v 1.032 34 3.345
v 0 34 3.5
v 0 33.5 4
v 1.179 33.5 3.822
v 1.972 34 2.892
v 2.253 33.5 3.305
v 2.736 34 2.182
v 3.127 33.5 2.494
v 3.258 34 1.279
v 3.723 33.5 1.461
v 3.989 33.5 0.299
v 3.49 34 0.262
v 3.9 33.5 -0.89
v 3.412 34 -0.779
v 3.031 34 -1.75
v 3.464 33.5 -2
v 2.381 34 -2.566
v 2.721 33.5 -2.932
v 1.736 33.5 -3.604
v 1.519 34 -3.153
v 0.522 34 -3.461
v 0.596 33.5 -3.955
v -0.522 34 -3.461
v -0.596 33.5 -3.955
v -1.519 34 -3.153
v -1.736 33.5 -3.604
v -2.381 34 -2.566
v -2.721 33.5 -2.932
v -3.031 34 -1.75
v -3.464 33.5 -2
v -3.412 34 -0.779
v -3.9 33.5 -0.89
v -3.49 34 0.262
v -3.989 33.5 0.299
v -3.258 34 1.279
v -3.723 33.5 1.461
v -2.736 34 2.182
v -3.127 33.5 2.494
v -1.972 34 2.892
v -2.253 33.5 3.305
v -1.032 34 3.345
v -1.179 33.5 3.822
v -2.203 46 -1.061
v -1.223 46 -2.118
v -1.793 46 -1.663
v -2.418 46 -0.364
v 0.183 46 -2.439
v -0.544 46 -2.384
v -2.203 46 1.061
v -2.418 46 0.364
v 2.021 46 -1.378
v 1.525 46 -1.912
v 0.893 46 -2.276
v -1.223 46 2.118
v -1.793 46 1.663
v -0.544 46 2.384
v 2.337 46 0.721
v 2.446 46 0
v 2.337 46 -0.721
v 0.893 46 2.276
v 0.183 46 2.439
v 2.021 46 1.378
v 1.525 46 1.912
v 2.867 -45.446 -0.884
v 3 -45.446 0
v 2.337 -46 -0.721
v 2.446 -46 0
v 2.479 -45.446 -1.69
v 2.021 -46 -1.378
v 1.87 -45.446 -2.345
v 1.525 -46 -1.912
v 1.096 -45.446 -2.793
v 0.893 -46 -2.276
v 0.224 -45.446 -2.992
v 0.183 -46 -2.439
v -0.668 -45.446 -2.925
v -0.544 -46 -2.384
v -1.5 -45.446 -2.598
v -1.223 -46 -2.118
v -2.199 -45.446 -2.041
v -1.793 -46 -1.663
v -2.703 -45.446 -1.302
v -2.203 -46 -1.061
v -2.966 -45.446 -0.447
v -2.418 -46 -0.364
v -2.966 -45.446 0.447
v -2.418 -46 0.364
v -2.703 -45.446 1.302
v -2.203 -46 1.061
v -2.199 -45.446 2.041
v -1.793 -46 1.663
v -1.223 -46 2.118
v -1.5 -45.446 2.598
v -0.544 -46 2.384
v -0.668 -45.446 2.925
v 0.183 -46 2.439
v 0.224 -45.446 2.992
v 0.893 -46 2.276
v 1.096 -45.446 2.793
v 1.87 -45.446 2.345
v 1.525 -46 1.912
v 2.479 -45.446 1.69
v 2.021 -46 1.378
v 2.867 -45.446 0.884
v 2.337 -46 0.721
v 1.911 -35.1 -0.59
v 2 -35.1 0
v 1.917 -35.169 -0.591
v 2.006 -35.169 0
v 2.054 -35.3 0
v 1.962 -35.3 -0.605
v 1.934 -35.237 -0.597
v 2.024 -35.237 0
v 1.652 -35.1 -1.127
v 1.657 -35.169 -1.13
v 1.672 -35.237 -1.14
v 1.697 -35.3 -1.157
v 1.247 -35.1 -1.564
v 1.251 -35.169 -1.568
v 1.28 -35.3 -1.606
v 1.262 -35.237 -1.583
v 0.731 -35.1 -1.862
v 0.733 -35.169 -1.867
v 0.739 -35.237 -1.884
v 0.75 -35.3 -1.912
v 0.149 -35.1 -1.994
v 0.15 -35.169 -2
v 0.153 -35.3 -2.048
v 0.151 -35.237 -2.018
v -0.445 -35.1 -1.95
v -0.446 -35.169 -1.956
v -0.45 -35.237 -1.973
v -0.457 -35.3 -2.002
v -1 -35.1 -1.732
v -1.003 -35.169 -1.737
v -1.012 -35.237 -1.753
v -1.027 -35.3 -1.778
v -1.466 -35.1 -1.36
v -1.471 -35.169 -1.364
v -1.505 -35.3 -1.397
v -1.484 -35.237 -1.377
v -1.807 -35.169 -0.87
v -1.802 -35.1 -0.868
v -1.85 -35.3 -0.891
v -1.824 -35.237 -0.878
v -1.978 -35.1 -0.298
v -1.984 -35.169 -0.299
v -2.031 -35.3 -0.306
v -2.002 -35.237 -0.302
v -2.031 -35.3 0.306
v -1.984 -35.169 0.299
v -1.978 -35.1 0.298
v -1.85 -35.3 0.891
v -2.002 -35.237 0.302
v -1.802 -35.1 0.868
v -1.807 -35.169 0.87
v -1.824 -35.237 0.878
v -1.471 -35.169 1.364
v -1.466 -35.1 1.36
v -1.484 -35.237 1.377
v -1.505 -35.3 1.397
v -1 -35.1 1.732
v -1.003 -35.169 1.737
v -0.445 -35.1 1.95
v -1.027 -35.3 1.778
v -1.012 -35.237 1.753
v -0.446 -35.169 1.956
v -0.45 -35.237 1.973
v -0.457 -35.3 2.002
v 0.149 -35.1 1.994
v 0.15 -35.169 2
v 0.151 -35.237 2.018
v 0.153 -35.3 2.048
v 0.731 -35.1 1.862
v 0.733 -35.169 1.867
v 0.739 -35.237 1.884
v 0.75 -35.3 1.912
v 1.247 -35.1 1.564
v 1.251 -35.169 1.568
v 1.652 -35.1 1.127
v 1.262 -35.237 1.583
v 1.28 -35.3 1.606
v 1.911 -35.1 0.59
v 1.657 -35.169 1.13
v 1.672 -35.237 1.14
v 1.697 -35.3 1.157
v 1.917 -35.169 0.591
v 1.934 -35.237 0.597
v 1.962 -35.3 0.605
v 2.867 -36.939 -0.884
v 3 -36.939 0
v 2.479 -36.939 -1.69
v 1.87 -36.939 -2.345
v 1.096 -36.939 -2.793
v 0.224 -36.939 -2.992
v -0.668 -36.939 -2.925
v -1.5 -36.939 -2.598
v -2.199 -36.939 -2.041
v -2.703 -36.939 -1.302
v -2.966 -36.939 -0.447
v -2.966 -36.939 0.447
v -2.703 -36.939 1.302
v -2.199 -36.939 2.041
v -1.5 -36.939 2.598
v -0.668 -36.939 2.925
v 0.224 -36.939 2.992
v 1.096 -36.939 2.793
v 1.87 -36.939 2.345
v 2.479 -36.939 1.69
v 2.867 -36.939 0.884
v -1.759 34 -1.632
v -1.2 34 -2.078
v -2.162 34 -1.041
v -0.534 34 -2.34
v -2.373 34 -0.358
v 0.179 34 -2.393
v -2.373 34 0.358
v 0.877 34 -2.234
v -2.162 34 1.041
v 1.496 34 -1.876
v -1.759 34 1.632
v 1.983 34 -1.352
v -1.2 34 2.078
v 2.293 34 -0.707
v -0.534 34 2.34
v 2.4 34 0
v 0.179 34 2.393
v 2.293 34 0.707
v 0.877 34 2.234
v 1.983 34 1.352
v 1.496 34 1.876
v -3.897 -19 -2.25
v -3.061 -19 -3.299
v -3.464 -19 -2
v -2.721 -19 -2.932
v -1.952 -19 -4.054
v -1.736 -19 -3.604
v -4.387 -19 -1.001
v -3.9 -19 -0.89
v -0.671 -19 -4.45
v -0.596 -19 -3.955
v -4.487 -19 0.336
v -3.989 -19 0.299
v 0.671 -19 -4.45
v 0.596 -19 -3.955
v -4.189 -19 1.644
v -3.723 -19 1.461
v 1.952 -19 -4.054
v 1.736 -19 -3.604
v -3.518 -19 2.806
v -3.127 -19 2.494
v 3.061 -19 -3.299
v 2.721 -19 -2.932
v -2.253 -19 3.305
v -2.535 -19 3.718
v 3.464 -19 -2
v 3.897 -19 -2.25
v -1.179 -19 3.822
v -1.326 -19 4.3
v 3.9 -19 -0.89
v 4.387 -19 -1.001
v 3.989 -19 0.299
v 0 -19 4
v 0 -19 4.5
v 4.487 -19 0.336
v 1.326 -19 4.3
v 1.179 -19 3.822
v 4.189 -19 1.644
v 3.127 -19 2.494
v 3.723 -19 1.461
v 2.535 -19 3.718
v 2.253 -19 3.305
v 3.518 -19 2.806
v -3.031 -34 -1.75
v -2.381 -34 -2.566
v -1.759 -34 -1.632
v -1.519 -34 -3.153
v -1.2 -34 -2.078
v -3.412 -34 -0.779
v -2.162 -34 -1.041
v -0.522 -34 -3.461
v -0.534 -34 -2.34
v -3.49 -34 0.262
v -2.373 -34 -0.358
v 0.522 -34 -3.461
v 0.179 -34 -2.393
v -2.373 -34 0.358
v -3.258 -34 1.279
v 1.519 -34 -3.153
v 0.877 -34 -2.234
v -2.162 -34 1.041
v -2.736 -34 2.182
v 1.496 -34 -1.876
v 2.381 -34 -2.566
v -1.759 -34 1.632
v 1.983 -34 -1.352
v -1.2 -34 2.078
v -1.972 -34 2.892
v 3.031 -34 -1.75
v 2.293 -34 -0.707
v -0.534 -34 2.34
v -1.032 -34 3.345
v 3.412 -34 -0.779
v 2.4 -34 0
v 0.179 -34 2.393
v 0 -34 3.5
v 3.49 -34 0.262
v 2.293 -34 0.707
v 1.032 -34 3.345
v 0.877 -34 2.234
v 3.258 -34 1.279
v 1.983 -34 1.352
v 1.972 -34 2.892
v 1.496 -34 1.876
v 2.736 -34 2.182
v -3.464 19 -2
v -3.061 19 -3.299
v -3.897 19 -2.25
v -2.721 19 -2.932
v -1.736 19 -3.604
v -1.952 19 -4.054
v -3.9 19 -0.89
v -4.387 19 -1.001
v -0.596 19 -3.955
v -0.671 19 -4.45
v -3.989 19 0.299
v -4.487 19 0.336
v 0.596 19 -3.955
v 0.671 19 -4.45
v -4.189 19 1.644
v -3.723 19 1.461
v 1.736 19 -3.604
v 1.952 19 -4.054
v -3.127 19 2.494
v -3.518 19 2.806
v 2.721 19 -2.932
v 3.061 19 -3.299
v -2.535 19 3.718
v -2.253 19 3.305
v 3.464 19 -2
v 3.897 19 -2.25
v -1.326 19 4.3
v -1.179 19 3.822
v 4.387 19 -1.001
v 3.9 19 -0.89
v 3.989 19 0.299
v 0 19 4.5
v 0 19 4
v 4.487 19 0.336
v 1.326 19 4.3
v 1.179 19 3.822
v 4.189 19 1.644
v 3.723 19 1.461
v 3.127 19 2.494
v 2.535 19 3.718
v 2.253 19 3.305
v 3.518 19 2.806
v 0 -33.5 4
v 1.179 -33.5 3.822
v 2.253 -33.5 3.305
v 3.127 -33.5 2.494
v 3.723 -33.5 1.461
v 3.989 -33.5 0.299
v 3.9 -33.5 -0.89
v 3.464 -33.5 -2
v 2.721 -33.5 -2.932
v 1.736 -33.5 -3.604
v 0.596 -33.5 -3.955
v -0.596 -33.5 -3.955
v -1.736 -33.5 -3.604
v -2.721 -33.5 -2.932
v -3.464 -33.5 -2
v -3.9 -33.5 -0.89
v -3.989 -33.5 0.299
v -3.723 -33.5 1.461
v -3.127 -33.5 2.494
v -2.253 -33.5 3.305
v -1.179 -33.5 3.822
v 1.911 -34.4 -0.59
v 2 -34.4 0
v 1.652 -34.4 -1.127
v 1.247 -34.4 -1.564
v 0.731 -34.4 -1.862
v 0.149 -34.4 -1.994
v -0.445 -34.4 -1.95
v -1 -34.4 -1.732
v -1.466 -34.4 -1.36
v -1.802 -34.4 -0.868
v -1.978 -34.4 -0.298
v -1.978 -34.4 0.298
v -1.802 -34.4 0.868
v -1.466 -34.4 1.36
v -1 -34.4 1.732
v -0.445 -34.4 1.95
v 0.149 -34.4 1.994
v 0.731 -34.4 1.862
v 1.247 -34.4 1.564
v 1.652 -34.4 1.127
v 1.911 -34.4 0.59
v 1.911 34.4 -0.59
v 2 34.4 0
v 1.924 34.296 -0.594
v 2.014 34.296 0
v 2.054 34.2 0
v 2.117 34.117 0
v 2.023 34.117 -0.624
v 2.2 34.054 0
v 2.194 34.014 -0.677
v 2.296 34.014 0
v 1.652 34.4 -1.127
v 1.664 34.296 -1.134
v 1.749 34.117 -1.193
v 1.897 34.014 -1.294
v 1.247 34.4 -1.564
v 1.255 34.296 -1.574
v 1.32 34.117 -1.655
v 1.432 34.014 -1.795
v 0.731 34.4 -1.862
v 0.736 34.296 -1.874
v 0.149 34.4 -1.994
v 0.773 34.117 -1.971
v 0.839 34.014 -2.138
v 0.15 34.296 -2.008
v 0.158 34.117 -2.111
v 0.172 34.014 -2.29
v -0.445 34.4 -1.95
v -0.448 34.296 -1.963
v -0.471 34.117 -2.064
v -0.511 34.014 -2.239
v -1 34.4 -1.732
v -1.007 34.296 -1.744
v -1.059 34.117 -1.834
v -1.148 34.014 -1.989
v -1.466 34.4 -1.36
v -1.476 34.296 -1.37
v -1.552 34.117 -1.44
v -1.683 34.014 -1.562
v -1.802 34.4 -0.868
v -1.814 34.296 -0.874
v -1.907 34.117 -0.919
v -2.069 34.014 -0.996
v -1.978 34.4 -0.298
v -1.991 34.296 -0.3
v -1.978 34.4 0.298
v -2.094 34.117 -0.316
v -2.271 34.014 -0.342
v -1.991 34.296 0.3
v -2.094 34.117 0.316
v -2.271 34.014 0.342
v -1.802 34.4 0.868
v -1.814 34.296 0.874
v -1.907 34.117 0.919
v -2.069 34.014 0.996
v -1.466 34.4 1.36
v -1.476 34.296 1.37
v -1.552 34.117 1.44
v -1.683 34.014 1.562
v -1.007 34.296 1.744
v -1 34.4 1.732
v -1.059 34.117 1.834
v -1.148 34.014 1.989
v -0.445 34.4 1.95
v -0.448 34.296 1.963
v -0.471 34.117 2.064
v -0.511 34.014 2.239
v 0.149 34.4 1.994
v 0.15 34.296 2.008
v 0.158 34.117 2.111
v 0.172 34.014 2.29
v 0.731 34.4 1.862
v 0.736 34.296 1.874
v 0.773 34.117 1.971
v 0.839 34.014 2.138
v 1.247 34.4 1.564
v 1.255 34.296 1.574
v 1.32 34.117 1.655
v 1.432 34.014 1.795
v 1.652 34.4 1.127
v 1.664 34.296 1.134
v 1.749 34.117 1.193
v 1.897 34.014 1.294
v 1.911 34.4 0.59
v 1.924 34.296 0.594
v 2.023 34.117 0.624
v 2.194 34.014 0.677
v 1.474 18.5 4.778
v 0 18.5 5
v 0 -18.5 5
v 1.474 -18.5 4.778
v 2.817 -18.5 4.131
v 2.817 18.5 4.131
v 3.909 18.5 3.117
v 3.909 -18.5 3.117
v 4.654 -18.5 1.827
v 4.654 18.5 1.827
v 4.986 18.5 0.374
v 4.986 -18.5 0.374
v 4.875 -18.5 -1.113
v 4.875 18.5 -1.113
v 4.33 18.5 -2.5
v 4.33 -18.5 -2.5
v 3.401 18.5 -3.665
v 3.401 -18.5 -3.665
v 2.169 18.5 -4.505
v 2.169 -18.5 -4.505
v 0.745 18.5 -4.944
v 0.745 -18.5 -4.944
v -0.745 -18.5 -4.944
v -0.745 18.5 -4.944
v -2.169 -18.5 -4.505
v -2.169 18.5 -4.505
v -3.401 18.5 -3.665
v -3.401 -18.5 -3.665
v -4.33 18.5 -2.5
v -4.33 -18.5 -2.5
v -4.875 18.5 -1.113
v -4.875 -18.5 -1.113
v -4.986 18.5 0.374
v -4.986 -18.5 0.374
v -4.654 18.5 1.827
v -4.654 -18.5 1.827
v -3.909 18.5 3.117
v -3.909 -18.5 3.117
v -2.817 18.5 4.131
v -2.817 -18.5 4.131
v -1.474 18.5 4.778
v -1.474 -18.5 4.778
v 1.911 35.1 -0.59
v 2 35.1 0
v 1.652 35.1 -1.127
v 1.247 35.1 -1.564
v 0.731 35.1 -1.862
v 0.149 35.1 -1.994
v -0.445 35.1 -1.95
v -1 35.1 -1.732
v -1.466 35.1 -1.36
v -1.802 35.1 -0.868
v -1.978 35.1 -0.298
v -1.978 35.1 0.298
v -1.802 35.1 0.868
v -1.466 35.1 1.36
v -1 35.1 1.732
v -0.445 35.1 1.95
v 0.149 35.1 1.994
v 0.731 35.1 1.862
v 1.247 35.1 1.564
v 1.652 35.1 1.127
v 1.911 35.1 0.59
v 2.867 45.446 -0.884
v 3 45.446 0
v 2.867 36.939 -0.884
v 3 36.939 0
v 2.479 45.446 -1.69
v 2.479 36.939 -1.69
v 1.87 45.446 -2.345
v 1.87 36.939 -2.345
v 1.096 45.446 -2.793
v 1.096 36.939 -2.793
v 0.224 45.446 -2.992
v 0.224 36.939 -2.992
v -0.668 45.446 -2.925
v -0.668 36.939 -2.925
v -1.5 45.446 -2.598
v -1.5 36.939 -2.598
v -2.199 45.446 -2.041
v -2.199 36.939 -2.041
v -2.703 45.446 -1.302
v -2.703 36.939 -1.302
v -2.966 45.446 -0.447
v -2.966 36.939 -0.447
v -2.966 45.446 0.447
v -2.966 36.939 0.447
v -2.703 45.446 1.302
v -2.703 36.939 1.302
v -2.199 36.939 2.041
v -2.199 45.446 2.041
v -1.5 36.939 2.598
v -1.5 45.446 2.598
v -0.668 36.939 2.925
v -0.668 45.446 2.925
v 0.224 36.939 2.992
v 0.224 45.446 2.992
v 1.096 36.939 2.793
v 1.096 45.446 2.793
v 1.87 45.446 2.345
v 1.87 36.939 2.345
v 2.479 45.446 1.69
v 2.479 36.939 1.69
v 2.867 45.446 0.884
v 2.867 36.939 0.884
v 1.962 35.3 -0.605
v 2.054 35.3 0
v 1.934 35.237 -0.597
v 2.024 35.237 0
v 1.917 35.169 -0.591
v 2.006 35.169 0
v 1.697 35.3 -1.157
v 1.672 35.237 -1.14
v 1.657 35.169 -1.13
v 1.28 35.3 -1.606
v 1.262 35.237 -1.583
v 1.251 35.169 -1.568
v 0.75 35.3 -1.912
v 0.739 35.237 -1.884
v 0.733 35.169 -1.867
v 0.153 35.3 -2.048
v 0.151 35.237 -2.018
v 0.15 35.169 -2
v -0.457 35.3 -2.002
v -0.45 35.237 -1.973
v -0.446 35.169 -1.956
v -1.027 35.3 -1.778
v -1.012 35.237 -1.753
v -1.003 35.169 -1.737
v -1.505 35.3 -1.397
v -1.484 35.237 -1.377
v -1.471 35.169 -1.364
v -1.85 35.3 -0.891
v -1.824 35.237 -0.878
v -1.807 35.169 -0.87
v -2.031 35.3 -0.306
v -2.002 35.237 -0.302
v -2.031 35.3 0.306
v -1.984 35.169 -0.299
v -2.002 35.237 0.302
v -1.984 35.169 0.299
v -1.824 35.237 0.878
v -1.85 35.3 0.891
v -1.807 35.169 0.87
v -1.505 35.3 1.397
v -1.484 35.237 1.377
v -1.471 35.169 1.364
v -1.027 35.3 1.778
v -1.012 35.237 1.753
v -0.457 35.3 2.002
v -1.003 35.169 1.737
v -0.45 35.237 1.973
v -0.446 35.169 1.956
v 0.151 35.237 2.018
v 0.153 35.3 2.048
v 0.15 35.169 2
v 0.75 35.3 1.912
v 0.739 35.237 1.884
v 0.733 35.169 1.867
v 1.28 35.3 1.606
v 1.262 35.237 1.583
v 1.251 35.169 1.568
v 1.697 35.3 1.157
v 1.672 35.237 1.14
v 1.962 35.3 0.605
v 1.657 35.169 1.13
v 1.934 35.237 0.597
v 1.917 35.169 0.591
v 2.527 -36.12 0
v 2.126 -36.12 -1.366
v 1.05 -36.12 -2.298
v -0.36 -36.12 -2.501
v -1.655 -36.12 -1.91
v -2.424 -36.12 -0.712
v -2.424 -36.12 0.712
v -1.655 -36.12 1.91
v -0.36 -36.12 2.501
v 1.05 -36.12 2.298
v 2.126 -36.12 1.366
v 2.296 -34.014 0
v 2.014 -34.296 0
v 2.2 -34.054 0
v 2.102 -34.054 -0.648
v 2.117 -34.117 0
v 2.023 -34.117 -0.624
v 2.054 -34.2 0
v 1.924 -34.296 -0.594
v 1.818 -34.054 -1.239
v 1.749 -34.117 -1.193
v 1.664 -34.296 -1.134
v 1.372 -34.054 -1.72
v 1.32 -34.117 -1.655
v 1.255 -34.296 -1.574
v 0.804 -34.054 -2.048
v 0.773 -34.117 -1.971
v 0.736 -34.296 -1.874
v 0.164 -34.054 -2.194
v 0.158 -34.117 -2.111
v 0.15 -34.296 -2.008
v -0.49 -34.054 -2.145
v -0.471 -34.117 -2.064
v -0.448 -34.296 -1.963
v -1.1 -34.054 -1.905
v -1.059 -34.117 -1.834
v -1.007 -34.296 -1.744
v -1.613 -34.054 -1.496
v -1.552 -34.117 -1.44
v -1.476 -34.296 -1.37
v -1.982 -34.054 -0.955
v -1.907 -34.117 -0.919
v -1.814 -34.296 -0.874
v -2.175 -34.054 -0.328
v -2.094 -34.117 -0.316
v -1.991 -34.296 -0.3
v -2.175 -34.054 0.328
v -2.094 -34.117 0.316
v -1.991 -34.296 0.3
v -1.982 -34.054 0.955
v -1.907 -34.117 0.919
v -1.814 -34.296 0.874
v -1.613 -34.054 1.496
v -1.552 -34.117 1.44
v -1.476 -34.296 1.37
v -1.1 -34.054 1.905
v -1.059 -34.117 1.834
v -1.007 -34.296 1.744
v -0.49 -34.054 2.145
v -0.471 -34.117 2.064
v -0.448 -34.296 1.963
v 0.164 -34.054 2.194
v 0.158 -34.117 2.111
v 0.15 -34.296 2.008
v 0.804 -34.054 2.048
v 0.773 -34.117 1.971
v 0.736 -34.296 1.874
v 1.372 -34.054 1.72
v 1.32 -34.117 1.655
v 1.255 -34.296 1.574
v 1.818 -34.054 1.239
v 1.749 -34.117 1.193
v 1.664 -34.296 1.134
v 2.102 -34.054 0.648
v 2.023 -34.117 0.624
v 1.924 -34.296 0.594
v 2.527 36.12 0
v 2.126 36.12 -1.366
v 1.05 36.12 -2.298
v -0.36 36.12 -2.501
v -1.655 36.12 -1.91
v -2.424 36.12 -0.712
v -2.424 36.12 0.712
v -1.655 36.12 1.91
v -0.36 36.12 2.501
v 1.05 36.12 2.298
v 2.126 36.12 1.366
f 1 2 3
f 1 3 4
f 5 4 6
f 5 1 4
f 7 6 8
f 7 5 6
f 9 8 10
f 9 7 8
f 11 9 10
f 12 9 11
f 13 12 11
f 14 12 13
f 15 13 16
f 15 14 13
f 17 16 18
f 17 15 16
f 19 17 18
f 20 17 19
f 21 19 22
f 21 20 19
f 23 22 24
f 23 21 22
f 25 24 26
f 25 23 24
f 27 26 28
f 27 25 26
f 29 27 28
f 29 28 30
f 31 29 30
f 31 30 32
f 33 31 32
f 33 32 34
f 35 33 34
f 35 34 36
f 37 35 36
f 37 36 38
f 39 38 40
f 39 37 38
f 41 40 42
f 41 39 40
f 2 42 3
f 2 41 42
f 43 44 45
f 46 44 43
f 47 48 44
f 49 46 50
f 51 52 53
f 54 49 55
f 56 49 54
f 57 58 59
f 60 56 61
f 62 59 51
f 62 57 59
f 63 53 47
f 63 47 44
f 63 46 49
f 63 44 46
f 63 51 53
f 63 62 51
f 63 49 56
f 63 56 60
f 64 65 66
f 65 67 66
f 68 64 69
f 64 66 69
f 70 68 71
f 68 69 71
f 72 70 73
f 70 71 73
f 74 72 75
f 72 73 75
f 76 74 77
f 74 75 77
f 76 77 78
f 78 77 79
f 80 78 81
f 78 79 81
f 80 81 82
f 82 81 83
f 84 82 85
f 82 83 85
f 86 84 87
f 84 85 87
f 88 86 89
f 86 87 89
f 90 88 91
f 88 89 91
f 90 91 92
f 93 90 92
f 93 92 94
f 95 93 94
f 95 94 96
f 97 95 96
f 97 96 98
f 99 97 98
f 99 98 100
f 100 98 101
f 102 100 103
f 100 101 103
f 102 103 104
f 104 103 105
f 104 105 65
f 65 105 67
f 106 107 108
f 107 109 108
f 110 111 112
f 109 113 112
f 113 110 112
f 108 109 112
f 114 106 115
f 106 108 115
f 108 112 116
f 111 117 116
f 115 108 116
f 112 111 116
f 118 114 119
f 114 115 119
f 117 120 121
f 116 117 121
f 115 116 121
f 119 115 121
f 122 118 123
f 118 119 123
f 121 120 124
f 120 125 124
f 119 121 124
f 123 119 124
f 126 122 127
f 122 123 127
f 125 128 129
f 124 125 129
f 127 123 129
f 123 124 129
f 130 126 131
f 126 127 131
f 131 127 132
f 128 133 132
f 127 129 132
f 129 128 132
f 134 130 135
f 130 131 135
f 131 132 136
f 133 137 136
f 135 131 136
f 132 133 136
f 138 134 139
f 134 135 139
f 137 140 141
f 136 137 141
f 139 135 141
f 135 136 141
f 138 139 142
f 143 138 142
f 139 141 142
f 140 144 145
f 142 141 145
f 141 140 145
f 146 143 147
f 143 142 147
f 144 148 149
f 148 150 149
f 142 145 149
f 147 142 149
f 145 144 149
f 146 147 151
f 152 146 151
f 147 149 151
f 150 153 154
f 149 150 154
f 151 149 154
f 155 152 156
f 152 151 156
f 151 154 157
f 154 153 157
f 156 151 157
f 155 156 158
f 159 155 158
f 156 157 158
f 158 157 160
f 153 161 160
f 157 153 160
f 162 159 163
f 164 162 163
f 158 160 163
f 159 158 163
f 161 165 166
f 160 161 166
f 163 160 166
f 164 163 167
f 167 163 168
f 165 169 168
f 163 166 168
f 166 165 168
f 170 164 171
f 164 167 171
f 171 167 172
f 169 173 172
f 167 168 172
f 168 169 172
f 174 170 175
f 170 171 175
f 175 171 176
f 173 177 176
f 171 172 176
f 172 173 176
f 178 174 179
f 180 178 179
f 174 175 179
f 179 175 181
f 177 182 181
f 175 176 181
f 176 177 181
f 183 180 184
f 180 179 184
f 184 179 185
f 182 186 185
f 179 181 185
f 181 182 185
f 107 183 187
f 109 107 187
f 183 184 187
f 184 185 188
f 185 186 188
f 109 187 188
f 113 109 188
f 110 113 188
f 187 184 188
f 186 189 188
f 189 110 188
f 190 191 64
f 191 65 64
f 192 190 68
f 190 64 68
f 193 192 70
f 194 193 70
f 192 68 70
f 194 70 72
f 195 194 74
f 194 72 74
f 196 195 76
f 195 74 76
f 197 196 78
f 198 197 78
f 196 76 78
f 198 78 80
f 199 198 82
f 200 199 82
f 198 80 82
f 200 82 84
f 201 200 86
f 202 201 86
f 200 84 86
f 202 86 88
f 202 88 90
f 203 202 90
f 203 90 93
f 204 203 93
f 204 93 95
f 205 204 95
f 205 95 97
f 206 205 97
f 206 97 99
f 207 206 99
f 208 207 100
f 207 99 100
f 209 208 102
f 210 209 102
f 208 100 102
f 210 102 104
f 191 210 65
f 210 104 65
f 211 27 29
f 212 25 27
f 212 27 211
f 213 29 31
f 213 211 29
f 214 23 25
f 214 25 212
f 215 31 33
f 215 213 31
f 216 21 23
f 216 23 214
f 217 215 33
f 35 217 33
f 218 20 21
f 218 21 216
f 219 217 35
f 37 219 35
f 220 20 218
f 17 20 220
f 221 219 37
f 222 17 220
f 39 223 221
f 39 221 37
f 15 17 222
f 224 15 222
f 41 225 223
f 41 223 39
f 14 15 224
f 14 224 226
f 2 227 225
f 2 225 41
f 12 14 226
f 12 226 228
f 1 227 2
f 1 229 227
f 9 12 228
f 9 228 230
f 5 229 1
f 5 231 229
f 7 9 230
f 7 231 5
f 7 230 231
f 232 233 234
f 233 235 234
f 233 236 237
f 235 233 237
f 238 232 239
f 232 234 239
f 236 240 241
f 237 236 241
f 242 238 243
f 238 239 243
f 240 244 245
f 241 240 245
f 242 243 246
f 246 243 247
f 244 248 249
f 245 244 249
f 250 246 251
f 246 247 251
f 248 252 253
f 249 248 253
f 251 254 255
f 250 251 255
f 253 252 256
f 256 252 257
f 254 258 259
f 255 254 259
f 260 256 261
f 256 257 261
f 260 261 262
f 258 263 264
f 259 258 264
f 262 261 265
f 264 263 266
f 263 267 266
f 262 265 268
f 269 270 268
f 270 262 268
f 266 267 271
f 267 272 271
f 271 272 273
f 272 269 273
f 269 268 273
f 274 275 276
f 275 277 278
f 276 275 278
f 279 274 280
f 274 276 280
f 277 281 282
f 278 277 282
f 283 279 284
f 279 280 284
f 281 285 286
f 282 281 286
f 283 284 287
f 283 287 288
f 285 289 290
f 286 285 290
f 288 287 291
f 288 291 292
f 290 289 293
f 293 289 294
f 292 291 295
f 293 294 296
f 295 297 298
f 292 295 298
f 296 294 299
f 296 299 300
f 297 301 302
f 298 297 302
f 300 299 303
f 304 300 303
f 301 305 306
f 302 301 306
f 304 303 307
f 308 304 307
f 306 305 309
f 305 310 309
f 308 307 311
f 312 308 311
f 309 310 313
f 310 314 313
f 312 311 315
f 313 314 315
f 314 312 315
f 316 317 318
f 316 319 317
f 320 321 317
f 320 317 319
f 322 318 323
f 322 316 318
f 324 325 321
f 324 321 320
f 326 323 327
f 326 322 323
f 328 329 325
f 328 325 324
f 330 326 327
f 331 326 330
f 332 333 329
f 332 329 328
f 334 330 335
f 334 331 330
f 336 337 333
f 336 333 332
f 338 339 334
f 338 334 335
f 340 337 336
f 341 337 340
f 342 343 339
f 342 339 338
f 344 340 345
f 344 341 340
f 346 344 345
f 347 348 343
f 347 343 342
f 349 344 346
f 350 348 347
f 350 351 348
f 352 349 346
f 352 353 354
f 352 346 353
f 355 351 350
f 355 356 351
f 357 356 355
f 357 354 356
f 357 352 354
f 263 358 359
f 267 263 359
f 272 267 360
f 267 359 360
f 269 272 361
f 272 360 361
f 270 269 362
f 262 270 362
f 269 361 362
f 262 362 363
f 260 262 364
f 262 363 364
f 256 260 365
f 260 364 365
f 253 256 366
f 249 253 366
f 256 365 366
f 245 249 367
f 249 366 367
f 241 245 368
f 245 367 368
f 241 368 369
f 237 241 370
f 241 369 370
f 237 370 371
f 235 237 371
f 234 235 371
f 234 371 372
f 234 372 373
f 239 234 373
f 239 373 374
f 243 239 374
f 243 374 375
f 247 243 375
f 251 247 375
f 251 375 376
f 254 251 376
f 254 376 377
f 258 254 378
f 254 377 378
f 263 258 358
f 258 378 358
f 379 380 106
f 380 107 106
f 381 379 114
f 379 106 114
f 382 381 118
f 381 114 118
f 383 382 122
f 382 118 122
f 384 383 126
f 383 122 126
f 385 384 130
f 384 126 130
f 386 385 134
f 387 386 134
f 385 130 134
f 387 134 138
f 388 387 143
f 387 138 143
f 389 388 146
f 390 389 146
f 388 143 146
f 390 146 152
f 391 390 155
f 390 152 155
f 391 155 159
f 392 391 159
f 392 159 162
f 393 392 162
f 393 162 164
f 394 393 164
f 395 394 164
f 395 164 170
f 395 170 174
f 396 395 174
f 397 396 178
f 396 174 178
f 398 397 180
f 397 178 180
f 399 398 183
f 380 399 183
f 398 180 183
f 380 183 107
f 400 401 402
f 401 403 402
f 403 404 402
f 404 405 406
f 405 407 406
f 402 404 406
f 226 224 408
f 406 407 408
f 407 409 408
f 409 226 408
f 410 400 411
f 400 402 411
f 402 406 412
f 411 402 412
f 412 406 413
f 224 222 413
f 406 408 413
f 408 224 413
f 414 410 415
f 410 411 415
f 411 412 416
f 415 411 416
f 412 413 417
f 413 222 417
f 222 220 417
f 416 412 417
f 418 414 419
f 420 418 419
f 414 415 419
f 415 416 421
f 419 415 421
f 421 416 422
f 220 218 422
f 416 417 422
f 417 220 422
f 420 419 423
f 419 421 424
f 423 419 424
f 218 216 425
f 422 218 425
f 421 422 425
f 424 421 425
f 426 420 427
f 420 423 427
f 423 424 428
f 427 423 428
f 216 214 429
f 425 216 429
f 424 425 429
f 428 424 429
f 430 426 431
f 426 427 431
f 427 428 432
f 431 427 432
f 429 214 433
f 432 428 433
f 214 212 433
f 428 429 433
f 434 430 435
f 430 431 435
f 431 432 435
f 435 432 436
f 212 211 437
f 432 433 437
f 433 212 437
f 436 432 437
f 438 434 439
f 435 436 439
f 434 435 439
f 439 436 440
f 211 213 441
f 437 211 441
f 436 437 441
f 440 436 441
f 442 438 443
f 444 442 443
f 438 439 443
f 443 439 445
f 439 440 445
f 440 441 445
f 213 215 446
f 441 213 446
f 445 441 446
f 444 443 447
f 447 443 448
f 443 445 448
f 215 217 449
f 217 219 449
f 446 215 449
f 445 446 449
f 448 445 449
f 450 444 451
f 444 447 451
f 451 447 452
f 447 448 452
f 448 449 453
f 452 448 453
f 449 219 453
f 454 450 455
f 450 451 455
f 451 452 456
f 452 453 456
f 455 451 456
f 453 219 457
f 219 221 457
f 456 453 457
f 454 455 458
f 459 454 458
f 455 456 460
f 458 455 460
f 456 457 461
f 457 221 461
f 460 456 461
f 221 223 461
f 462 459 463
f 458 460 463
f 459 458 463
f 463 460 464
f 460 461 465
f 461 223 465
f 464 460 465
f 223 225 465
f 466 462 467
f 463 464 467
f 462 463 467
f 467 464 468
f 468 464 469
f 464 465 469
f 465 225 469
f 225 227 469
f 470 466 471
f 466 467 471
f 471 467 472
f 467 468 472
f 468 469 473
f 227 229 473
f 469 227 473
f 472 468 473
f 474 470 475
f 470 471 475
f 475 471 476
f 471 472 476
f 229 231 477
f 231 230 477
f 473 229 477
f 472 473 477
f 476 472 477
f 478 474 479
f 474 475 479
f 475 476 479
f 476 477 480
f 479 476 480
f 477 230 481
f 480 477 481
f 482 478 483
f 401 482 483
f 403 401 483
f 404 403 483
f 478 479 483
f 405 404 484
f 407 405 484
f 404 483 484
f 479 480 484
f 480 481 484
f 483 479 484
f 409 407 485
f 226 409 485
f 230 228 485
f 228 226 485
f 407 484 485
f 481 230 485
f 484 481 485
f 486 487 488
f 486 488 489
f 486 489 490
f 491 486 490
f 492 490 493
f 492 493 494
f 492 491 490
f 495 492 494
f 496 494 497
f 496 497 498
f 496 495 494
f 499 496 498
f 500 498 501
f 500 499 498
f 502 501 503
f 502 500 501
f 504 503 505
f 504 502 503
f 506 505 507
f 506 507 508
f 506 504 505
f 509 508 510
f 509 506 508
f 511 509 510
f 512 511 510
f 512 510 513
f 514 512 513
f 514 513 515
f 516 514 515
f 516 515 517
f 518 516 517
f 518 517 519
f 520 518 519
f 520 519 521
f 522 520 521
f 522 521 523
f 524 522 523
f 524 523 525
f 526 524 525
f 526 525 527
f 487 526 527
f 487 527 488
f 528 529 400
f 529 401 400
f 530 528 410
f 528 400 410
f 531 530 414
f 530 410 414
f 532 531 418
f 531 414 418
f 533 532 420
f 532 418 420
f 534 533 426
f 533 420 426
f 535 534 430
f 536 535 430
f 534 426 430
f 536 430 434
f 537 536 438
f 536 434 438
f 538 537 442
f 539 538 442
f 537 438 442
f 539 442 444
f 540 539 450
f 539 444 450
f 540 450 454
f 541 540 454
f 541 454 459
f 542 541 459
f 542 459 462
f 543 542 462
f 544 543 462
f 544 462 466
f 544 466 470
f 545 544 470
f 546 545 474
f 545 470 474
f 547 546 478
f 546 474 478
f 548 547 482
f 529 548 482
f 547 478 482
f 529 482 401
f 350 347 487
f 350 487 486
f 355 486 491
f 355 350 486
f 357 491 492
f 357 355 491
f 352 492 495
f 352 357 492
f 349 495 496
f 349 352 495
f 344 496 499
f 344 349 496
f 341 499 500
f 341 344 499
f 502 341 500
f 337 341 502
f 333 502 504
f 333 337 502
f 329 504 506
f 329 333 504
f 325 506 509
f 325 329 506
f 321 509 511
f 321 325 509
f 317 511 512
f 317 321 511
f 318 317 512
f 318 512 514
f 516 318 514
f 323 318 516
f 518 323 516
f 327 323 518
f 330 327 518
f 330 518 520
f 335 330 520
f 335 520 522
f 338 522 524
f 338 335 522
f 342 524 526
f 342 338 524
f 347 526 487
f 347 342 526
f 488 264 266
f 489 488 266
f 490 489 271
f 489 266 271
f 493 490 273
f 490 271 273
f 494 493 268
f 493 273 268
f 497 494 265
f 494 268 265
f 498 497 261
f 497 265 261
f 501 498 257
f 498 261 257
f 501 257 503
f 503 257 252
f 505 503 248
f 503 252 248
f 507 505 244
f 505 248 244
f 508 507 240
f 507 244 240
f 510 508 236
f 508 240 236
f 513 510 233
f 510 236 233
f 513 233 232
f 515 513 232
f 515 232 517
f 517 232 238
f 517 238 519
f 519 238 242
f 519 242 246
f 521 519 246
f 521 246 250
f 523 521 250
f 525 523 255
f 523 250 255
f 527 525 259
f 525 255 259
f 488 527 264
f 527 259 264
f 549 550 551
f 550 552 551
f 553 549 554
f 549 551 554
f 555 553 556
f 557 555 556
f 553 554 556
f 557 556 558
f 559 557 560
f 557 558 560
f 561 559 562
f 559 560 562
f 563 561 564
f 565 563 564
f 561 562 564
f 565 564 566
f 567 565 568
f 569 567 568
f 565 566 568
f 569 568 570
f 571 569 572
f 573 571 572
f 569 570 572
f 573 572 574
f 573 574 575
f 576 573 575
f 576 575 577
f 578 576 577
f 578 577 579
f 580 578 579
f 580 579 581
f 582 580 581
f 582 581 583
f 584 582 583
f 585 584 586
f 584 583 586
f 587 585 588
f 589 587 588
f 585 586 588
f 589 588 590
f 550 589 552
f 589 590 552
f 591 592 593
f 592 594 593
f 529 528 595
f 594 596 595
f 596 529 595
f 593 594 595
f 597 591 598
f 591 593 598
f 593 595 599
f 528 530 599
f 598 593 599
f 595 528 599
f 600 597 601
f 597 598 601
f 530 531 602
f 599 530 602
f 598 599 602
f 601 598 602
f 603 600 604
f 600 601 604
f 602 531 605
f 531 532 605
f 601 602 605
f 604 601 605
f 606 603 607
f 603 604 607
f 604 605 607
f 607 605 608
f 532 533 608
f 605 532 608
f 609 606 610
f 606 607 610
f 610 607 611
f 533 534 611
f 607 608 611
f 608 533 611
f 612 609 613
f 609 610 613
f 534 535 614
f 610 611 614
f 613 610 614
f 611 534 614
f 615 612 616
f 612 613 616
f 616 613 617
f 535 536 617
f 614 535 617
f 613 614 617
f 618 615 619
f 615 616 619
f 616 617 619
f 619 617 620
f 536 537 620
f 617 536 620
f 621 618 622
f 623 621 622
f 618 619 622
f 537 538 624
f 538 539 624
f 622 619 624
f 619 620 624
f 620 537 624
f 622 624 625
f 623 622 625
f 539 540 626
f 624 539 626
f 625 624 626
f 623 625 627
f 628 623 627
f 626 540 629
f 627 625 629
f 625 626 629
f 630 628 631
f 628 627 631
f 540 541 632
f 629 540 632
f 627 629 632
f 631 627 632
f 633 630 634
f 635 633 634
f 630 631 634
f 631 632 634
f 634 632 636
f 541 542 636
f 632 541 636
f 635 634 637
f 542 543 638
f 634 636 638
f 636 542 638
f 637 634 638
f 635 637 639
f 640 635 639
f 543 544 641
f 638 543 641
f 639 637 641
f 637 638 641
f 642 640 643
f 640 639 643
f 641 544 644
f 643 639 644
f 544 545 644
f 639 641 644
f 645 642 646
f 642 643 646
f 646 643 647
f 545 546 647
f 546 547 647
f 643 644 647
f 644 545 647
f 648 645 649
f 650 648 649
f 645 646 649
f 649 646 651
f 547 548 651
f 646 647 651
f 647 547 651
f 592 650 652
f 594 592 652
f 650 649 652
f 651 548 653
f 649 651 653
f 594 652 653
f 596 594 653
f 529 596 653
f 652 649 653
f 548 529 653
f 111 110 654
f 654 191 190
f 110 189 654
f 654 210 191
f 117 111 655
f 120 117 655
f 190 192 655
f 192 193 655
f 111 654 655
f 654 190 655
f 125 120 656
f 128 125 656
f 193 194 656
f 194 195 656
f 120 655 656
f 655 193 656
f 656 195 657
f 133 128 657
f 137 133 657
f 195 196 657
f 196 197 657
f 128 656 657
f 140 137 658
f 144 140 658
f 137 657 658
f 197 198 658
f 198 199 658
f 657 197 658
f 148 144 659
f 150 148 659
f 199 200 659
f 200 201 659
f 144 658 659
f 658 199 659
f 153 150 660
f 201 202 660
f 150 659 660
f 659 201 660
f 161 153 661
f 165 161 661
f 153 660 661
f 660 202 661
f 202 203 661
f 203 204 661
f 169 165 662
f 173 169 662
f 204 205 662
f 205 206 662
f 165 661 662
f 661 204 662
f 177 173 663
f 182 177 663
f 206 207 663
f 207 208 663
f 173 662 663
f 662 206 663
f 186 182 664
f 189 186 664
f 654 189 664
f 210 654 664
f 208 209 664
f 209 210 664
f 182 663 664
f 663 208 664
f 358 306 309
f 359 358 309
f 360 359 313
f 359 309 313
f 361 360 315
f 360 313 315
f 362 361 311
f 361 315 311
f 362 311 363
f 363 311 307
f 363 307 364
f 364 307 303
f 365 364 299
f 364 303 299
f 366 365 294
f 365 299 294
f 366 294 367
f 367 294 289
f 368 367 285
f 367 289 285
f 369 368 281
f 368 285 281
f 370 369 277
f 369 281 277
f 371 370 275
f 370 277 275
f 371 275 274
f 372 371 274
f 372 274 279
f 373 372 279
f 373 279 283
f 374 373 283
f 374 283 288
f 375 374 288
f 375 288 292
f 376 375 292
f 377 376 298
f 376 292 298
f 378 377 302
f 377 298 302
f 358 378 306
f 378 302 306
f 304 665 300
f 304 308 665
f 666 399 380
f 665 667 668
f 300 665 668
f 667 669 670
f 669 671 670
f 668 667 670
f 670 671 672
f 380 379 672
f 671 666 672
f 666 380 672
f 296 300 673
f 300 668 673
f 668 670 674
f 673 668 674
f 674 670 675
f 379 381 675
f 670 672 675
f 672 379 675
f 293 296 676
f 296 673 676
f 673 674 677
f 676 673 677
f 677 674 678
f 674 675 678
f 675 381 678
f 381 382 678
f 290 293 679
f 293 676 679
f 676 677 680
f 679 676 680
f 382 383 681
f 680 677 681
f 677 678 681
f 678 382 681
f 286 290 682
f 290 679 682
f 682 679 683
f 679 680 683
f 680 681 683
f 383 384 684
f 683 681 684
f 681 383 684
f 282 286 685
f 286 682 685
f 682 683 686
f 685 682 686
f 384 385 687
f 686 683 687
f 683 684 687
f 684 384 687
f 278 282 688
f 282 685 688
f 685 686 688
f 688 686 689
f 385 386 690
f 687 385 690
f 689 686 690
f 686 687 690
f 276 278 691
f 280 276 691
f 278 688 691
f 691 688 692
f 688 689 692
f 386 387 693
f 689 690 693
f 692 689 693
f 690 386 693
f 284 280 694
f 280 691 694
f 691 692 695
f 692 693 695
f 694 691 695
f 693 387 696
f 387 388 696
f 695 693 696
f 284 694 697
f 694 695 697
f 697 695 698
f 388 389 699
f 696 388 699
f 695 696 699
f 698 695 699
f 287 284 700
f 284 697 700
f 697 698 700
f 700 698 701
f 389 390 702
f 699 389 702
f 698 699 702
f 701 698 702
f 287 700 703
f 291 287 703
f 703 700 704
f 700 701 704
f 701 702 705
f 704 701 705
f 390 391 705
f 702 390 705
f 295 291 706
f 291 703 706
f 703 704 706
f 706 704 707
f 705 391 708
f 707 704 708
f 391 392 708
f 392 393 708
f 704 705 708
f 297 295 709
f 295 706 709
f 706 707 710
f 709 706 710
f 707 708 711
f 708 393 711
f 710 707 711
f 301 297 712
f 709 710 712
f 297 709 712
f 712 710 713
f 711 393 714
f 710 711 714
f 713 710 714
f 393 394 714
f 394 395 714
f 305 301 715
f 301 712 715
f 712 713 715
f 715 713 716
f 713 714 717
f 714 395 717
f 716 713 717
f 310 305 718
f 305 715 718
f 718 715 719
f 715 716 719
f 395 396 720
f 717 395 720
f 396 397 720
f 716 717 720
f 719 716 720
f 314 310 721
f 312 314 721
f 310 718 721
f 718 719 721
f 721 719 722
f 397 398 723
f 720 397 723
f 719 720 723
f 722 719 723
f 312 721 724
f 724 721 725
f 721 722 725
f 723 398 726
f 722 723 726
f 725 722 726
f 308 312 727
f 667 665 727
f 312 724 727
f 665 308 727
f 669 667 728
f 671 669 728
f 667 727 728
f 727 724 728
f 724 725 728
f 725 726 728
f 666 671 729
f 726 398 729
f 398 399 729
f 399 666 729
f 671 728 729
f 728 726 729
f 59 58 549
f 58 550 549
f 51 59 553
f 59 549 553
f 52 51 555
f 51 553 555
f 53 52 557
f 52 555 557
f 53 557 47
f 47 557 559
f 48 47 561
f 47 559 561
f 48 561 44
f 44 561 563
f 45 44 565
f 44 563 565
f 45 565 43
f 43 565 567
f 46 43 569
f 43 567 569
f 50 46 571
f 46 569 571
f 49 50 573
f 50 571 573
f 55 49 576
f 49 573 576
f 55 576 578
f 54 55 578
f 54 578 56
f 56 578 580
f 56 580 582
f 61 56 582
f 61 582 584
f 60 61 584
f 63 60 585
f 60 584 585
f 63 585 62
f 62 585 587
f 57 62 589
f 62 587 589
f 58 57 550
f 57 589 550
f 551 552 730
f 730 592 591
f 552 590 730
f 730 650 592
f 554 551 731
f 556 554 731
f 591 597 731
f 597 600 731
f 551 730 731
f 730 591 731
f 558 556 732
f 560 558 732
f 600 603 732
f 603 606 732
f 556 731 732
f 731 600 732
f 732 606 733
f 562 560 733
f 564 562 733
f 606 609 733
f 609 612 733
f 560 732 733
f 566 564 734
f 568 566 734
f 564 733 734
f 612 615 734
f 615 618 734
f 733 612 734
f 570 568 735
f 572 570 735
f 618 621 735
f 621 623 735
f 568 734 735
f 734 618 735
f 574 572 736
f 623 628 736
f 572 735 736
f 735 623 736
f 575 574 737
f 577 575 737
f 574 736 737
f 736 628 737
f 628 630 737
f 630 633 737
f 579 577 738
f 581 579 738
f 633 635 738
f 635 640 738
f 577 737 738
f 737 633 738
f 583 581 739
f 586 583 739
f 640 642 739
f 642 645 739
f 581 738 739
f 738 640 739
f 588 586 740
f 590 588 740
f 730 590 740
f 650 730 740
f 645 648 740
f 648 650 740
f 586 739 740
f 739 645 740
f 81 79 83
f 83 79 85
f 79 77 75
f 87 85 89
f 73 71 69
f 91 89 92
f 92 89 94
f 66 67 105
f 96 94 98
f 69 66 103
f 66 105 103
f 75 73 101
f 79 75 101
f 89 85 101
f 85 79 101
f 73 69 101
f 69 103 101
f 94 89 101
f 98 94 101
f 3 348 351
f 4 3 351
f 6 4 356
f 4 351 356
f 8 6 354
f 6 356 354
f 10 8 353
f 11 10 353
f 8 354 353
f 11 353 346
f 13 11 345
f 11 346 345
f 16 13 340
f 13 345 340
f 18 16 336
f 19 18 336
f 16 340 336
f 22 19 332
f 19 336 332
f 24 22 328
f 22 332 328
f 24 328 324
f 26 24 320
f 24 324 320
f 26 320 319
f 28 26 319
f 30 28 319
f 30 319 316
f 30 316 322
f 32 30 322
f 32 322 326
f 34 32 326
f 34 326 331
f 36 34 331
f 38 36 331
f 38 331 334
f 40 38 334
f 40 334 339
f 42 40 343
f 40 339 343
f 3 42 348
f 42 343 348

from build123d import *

# Parameters (mm, degrees)
SKETCH1_R           = 5
BOSS_EXTRUDE1_DEPTH = 19
SKETCH2_R           = 4
BOSS_EXTRUDE2_DEPTH = 15
BOSS_EXTRUDE3_START = -53
SKETCH2_2_R         = 4
BOSS_EXTRUDE3_DEPTH = 15
CHAMFER2_SIZE       = 0.5
SKETCH3_R           = 3.1
BOSS_EXTRUDE4_DEPTH = 12
CHAMFER3_SIZE       = 0.5


# Read off the part's stored shape, not the designer's step: M6 Machine Threads Stud1, M6 Machine Threads Stud2
with BuildPart() as part:
    # Sketch1 → Boss-Extrude1 (new, symmetric)
    with BuildSketch(Plane(origin=(0, 0, 0), x_dir=(1, 0, 0), z_dir=(0, 1, 0))):
        with Locations(Location((0, 0, 0), (0, 0, 270))):
            Circle(SKETCH1_R)
    extrude(amount=BOSS_EXTRUDE1_DEPTH, both=True)

    # Sketch2 → Boss-Extrude2 (add)
    with BuildSketch(Plane(origin=(0, 19, 0), x_dir=(1, 0, 0), z_dir=(0, 1, 0))):
        with Locations(Location((0, 0, 0), (0, 0, 270))):
            Circle(SKETCH2_R)
    extrude(amount=BOSS_EXTRUDE2_DEPTH)

    # Sketch2<2> → Boss-Extrude3 (add)
    with BuildSketch(Plane(origin=(0, 19, 0), x_dir=(1, 0, 0), z_dir=(0, 1, 0)).offset(BOSS_EXTRUDE3_START)):
        with Locations(Location((0, 0, 0), (0, 0, 270))):
            Circle(SKETCH2_2_R)
    extrude(amount=BOSS_EXTRUDE3_DEPTH)

    # Chamfer2
    chamfer2_edges = [part.edges().sort_by_distance(p)[0] for p in [
        (0, -19, -5),
        (0, 19, -5),
    ]]
    chamfer(chamfer2_edges, length=CHAMFER2_SIZE)

    # Sketch3 → Boss-Extrude4 (add)
    with BuildSketch(Plane(origin=(0, 34, 0), x_dir=(1, 0, 0), z_dir=(0, 1, 0))):
        with Locations(Location((0, 0, 0), (0, 0, 270))):
            Circle(SKETCH3_R)
    boss_extrude4 = extrude(amount=BOSS_EXTRUDE4_DEPTH)

    # M6 Machine Threads Stud1 outline → M6 Machine Threads Stud1 (revolve, cut)
    with BuildSketch(Plane.XY):
        with BuildLine():
            Line((3.1, 46), (2.4455, 46))
            Line((2.4455, 46), (3, 45.4455))
            Line((3, 45.4455), (3, 36.939230485))
            Line((3, 36.939230485), (2.053589838, 35.3))
            ThreePointArc((2.053589838, 35.3), (2.013629669, 35.203527618), (2, 35.1))
            Line((2, 35.1), (2, 34.4))
            ThreePointArc((2, 34.4), (2.117157288, 34.117157288), (2.4, 34))
            Line((2.4, 34), (3.1, 34))
            Line((3.1, 34), (3.1, 46))
        make_face()
    revolve(axis=Axis((0, 0, 0), (0, 1, 0)), mode=Mode.SUBTRACT)

    # Mirror1: Boss-Extrude4 across plane
    add(boss_extrude4.mirror(Plane.ZX))

    # M6 Machine Threads Stud2 outline → M6 Machine Threads Stud2 (revolve, cut)
    with BuildSketch(Plane.XY):
        with BuildLine():
            Line((2.4455, -46), (3.1, -46))
            Line((3.1, -46), (3.1, -34))
            Line((3.1, -34), (2.4, -34))
            ThreePointArc((2.4, -34), (2.117157288, -34.117157288), (2, -34.4))
            Line((2, -34.4), (2, -35.1))
            ThreePointArc((2, -35.1), (2.013629669, -35.203527618), (2.053589838, -35.3))
            Line((2.053589838, -35.3), (3, -36.939230485))
            Line((3, -36.939230485), (3, -45.4455))
            Line((3, -45.4455), (2.4455, -46))
        make_face()
    revolve(axis=Axis((0, 0, 0), (0, 1, 0)), mode=Mode.SUBTRACT)

    # Chamfer3
    chamfer3_edges = [part.edges().sort_by_distance(p)[0] for p in [
        (0, -34, -4),
        (0, 34, -4),
    ]]
    chamfer(chamfer3_edges, length=CHAMFER3_SIZE)


solid = part.part
